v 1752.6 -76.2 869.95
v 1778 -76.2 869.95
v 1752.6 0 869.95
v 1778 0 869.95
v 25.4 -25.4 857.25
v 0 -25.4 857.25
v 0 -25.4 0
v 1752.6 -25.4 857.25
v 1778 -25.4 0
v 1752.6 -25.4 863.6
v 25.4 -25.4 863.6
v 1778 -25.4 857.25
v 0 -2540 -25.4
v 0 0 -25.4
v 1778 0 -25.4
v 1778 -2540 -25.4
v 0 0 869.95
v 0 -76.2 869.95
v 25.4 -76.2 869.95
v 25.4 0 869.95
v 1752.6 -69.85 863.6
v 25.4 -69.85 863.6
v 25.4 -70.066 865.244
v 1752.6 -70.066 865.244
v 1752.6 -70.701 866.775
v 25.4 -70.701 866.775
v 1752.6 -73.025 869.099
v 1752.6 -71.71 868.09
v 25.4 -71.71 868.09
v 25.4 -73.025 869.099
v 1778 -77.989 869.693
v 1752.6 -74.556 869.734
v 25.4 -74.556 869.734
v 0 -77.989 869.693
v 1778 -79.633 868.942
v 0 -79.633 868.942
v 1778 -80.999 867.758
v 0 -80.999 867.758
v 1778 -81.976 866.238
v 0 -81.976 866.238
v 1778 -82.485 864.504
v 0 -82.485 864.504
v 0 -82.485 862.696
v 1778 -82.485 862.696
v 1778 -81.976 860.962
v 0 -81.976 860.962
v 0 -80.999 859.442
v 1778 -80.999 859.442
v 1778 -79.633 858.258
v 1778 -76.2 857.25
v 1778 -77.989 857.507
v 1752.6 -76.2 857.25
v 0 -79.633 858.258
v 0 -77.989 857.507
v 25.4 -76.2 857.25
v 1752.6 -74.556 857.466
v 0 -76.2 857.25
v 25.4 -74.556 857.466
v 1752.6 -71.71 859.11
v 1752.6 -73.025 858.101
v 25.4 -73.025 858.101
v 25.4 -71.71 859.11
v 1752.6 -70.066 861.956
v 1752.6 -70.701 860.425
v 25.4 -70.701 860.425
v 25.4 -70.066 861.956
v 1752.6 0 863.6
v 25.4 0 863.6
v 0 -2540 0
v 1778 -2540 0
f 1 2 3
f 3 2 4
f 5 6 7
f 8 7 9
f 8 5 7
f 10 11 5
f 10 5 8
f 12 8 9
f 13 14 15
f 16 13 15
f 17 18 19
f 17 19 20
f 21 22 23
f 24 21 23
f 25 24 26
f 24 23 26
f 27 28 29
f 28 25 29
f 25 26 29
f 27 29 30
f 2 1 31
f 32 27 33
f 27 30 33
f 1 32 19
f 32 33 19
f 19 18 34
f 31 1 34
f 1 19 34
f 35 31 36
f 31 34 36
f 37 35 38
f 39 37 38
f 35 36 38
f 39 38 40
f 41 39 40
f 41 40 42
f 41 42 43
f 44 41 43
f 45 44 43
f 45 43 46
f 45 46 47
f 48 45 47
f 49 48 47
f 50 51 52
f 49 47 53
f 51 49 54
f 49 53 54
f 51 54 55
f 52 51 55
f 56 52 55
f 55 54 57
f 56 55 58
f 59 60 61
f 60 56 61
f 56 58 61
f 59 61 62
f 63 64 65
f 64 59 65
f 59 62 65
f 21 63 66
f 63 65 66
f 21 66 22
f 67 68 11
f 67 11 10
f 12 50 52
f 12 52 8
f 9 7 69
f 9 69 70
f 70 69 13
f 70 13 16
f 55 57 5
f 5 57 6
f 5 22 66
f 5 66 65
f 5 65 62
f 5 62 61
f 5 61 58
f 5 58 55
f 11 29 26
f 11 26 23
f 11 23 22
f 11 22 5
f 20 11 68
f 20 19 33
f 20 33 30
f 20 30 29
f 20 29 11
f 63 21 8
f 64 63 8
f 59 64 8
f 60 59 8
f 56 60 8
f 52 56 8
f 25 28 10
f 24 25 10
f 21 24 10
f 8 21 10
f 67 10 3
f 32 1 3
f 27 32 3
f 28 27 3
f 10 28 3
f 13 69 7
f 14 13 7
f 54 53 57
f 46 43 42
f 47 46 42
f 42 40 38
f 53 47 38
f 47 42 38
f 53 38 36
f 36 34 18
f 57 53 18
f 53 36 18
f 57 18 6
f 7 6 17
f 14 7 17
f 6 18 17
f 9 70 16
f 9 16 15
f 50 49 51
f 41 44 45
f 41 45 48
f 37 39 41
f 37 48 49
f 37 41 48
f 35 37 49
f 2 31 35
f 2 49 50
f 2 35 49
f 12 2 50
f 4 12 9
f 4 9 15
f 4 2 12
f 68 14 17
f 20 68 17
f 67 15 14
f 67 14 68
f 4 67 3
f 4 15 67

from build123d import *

# Parameters (mm, degrees)
F0_W      = 1778
F0_H      = 2540
F1_DEPTH  = 25.4
F2_W      = 1778
F2_H      = 863.6
F3_DEPTH  = 25.4
F4_R      = 6.35
F5_DEPTH  = 1778
F6_W      = 76.2
F6_H      = 12.7
F7_DEPTH  = 25.4
F9_W      = 76.2
F9_H      = 12.7
F10_DEPTH = 25.4


with BuildPart() as f1:
    # F0 (on Top) → F1 (new body)
    with BuildSketch(Plane.XY):
        with Locations((889, -1270)):
            Rectangle(F0_W, F0_H)
    extrude(amount=-F1_DEPTH)

    # F2 (on Front) → F3 (join)
    with BuildSketch(Plane.XZ):
        with Locations((889, 431.8)):
            Rectangle(F2_W, F2_H)
    extrude(amount=F3_DEPTH)



with BuildPart() as f5:
    # F4 (on Right) → F5 (new body, through all)
    with BuildSketch(Plane.YZ):
        with Locations((-76.2, 863.6)):
            Circle(F4_R)
    extrude(amount=F5_DEPTH)


with BuildPart() as f1_1:
    add(f1.part)

    add(f5.part)  # F7 merges F5
    # F6 (on Right) → F7 (join)
    with BuildSketch(Plane.YZ):
        with Locations((-38.1, 863.6)):
            Rectangle(F6_W, F6_H)
    extrude(amount=F7_DEPTH)

    # F9 (on offset) → F10 (join)
    with BuildSketch(Plane.YZ.offset(1778)):
        with Locations((-38.1, 863.6)):
            Rectangle(F9_W, F9_H)
    extrude(amount=-F10_DEPTH)


solid = f1_1.part
